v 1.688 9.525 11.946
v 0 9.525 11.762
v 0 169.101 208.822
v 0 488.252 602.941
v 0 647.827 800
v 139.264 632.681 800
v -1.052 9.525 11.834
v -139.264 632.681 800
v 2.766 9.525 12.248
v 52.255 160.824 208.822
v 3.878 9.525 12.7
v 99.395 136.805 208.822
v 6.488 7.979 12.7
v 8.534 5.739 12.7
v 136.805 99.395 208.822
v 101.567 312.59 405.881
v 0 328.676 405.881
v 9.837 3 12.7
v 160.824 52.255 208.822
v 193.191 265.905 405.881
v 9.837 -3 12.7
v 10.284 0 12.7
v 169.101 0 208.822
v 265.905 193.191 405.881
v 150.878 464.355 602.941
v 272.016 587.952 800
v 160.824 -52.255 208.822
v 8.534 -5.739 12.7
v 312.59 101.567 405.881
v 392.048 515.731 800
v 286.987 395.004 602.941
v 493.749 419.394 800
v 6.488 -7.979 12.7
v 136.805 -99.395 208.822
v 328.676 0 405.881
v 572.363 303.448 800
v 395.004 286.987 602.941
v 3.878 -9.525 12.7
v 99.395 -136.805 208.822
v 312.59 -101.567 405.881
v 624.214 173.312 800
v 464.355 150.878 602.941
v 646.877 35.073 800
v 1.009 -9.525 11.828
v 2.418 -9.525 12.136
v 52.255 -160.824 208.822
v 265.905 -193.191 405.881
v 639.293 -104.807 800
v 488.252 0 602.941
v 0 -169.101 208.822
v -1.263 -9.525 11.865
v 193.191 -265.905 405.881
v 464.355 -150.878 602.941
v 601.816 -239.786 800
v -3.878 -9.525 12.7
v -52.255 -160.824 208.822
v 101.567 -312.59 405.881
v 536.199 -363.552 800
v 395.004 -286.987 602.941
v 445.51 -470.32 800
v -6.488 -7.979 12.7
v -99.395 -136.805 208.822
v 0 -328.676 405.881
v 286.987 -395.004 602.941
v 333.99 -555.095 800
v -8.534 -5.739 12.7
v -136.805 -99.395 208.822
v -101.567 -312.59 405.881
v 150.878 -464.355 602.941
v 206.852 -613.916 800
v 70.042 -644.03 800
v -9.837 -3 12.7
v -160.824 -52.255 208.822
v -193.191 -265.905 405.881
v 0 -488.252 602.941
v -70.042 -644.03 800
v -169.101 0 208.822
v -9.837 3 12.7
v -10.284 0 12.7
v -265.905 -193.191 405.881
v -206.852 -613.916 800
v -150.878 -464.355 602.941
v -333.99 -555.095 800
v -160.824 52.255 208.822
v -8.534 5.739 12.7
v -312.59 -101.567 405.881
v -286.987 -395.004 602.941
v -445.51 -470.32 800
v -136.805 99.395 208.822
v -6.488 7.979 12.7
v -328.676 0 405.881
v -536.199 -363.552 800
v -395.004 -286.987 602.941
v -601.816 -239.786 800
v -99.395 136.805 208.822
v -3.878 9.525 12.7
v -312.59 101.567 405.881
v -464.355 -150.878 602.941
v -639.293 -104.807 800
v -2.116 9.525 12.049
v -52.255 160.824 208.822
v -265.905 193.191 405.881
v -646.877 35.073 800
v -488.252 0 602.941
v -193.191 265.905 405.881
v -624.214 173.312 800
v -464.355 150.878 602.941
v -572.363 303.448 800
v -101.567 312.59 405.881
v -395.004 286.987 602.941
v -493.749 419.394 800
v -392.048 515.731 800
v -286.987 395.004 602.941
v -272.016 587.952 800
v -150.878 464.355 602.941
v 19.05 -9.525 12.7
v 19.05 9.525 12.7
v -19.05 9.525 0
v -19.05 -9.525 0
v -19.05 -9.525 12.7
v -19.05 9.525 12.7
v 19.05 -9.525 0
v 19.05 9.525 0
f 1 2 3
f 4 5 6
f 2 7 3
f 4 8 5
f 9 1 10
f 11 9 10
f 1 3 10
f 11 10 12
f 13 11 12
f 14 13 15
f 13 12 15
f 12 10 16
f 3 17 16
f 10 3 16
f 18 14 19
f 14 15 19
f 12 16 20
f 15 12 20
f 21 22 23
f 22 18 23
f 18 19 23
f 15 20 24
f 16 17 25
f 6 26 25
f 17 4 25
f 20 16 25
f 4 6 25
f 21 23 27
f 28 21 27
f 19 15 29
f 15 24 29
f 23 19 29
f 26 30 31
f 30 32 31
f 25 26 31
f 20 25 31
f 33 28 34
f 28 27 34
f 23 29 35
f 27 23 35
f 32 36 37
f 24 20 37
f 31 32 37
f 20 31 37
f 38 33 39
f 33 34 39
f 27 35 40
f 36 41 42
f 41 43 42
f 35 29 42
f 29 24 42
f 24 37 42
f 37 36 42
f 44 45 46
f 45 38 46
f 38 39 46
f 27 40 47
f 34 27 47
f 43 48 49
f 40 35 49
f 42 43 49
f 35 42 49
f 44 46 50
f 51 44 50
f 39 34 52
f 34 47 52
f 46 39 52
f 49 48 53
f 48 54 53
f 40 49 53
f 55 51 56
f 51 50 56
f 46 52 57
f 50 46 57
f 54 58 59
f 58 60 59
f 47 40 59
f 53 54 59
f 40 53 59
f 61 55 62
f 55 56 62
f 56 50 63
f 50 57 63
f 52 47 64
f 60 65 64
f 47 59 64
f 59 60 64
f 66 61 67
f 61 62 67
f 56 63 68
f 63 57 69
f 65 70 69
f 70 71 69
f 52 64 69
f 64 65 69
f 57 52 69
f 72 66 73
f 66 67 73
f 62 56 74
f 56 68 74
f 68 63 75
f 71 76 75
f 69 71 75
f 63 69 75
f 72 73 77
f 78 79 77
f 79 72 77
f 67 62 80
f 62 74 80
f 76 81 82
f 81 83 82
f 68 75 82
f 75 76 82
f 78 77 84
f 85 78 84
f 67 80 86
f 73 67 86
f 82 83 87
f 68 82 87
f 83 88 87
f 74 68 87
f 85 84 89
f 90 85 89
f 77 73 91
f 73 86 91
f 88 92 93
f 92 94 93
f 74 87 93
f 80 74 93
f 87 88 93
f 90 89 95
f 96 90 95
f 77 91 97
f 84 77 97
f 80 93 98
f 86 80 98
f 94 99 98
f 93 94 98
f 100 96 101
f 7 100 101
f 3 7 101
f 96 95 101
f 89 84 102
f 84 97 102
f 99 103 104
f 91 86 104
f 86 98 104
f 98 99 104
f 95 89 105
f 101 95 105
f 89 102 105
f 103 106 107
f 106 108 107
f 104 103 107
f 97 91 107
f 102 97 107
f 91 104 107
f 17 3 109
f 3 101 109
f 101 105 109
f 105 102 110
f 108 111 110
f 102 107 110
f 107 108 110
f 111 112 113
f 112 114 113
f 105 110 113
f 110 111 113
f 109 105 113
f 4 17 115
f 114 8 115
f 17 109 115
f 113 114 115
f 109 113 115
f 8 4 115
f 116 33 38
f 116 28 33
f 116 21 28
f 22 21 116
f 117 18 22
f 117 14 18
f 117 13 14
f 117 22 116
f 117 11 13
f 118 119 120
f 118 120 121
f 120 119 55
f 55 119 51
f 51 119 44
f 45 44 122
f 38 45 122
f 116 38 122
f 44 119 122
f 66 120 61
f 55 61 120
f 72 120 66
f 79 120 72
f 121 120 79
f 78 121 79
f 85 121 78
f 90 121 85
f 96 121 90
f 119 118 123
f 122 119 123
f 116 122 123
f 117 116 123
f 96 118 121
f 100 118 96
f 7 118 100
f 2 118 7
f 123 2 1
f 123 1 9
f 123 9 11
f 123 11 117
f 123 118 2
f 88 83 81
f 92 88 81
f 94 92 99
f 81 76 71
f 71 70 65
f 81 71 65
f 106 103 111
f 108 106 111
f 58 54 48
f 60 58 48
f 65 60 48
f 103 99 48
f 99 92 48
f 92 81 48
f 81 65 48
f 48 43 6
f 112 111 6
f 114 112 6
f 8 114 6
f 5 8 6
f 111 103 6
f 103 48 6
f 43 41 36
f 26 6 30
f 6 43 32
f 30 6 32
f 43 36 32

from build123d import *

# Parameters (mm, degrees)
SKETCH1_W           = 38.1
SKETCH1_H           = 19.05
BOSS_EXTRUDE1_DEPTH = 12.7


with BuildPart() as part:
    # Sketch1 → Boss-Extrude1 (new body)
    with BuildSketch(Plane.XY):
        Rectangle(SKETCH1_W, SKETCH1_H)
    extrude(amount=BOSS_EXTRUDE1_DEPTH)

    # Sketch2 → Revolve1 (revolve)
    with BuildSketch(Plane(origin=(0, 0, 0), x_dir=(0, 0, -1), z_dir=(1, 0, 0))):
        Polygon((0, 0), (-800, 647.827226556), (-800, 0), align=None)
    revolve(axis=Axis((0, 0, 800), (0, 0, -1)))


solid = part.part
